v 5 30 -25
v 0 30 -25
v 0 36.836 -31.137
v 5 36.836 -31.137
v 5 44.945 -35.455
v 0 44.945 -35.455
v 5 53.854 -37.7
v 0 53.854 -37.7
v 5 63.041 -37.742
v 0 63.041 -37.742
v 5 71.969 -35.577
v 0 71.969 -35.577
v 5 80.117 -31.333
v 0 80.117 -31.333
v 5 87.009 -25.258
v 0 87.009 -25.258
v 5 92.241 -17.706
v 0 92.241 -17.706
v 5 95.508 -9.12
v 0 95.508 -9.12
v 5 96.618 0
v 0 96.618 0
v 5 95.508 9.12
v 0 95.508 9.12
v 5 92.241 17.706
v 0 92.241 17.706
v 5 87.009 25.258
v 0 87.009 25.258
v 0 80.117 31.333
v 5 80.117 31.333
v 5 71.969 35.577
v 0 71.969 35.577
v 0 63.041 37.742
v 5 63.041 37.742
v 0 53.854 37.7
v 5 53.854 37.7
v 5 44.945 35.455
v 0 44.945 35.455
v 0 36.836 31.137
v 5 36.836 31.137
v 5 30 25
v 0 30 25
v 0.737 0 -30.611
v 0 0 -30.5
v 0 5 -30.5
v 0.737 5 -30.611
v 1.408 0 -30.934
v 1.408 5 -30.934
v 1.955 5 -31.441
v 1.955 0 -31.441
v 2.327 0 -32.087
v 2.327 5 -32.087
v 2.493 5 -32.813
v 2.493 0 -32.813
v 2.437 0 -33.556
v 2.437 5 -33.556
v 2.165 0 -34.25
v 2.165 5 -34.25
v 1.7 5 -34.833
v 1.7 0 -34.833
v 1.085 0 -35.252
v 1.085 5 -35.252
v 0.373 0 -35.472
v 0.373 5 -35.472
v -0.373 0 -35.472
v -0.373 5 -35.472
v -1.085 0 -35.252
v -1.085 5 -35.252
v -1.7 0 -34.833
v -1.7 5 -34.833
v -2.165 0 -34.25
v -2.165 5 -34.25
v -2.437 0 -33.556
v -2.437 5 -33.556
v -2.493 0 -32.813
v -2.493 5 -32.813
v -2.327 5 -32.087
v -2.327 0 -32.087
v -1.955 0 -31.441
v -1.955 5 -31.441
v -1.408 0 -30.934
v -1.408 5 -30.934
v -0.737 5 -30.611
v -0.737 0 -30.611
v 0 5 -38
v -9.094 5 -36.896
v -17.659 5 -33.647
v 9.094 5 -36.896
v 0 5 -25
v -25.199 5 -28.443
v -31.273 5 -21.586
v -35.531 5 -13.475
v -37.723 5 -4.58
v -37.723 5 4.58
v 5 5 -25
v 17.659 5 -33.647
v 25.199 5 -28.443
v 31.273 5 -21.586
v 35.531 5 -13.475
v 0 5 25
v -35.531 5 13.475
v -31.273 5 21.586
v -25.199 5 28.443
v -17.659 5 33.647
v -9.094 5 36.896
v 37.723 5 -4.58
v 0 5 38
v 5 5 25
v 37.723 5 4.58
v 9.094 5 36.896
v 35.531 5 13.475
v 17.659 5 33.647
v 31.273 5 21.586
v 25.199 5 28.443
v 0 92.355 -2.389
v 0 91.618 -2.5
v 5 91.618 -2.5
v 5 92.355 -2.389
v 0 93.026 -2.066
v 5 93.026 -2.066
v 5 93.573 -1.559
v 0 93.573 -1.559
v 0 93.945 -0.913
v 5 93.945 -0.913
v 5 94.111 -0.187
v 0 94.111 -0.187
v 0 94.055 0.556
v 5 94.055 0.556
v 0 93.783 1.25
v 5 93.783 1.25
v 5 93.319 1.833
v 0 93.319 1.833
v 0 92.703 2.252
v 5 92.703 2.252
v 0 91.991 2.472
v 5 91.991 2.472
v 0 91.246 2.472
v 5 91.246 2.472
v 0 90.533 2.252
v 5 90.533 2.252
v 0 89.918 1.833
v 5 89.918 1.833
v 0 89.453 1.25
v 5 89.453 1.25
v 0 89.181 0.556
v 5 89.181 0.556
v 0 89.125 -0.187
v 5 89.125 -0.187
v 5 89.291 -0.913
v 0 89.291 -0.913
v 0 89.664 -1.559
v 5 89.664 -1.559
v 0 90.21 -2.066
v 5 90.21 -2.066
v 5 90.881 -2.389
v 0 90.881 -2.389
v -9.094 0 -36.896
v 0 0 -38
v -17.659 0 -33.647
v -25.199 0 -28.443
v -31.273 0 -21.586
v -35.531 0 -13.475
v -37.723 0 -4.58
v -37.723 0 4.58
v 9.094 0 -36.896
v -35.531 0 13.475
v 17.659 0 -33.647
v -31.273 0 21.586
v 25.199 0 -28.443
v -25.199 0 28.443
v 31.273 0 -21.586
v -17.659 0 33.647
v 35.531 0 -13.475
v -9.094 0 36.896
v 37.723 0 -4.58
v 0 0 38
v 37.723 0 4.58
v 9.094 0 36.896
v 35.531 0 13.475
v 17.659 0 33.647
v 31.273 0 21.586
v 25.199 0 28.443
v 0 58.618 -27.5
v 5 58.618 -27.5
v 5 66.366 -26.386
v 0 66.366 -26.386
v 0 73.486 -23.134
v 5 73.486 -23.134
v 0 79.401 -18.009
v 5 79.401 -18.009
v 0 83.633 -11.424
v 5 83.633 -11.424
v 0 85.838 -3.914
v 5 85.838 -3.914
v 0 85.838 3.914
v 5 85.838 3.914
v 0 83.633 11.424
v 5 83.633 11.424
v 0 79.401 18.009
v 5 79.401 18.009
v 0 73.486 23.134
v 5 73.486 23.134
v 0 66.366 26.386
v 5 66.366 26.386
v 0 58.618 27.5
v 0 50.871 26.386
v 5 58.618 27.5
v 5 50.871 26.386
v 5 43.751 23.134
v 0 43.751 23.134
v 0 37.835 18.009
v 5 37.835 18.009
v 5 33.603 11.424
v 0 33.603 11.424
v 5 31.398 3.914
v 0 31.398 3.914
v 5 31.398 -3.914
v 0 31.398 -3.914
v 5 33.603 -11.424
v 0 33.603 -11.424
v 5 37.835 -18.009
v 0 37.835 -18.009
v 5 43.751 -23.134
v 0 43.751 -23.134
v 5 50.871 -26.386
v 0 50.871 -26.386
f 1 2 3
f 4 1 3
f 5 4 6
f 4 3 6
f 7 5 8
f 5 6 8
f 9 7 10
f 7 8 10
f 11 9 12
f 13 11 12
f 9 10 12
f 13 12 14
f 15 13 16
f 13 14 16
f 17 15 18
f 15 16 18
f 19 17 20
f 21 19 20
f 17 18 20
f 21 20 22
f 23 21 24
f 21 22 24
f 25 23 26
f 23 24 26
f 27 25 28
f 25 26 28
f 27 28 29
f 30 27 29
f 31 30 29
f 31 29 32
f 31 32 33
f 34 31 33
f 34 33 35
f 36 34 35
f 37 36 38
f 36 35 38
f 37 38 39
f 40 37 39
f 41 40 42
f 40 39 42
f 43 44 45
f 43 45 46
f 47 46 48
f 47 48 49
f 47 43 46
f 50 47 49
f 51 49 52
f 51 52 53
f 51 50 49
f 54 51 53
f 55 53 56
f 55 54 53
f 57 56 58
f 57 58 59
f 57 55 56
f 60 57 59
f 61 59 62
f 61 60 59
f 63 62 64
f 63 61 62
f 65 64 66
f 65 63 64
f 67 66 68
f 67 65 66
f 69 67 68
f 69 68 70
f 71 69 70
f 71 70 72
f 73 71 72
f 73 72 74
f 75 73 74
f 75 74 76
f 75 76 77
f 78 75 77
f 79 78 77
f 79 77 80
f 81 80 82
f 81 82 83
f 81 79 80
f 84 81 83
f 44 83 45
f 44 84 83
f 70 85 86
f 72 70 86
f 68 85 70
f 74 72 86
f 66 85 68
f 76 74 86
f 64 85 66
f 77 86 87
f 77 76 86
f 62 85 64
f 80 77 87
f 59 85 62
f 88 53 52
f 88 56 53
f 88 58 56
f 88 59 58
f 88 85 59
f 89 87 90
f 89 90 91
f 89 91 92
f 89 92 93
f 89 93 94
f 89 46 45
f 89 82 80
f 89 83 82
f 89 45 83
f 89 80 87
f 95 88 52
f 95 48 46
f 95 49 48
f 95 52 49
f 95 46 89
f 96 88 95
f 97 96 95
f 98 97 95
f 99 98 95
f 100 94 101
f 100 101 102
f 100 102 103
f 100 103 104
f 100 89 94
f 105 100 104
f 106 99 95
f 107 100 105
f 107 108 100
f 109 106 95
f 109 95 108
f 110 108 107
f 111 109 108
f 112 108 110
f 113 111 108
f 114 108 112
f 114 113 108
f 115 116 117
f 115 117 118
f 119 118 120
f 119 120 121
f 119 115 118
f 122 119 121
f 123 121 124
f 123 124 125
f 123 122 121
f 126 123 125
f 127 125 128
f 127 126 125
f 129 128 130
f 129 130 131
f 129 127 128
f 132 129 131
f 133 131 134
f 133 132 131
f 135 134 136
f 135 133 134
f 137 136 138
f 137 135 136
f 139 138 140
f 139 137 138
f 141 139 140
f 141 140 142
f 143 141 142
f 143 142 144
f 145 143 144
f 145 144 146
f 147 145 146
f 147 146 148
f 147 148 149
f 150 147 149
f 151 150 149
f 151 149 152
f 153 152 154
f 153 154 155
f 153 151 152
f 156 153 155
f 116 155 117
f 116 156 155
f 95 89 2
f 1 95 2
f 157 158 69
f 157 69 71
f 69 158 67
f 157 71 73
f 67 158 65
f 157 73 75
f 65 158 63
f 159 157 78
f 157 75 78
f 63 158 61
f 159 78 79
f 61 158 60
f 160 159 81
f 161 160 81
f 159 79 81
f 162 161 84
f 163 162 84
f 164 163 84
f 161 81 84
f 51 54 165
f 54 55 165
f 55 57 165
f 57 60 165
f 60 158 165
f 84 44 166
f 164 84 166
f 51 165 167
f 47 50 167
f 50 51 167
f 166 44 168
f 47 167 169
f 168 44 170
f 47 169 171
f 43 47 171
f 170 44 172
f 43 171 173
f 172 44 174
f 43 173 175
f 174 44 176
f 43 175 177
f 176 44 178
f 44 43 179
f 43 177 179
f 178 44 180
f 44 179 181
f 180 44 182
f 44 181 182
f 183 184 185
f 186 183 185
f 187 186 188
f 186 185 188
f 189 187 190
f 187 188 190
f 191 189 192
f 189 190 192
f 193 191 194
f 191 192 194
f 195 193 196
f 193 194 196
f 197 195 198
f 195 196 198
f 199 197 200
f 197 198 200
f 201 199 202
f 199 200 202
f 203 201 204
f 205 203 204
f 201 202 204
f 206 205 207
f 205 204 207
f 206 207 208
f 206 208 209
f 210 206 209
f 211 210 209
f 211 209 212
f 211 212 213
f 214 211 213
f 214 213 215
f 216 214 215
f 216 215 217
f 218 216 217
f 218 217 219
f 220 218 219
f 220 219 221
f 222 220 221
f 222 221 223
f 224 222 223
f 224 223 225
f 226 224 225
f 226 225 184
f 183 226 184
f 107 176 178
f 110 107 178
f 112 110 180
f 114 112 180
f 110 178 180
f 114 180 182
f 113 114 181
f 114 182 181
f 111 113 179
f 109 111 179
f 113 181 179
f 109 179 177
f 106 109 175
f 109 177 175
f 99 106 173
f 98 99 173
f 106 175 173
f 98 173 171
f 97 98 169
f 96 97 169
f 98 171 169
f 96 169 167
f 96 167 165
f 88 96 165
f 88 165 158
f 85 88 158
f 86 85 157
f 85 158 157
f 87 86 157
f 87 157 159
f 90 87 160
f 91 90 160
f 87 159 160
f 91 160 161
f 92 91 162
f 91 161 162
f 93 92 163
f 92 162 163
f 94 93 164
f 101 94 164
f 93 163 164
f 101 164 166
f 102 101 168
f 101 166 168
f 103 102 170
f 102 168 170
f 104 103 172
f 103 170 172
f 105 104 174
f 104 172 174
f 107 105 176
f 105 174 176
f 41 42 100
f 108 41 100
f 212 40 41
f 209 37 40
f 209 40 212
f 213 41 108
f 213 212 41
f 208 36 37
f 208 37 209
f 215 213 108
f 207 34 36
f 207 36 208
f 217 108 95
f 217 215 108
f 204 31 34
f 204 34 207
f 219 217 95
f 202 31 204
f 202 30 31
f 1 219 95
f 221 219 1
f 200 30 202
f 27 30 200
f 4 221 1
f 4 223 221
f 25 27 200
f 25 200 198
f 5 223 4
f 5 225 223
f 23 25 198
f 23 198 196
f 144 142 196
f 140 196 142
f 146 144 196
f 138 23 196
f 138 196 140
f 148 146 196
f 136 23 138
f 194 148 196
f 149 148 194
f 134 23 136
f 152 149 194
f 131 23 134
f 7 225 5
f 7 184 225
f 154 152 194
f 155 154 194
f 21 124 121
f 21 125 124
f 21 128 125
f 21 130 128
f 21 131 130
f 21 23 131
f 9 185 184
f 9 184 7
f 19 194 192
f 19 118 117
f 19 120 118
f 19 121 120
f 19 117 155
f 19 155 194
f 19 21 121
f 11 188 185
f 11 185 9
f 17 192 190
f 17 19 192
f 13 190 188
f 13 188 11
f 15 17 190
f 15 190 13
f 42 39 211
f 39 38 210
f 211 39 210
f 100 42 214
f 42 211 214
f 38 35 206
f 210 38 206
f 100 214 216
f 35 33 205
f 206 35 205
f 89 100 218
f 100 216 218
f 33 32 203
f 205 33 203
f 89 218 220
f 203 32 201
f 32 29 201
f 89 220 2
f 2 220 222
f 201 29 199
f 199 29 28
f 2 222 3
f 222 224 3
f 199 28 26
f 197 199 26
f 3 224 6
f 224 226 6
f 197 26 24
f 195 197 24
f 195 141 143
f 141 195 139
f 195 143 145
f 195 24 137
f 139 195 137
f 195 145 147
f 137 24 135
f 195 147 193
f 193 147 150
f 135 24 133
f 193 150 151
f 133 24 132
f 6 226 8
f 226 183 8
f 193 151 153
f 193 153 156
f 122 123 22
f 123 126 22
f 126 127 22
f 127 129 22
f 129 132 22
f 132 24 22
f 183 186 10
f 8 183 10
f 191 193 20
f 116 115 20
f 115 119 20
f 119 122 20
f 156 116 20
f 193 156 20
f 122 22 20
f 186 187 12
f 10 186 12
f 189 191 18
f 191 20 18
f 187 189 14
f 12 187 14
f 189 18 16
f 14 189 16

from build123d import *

# Parameters (mm, degrees)
SKETCH_1_R          = 38
SKETCH_1_R_2        = 2.5
EXTRUDE_1_DEPTH     = 5
SKETCH_5_R          = 2.5
EXTRUDE_3_DEPTH     = 5
CUT_EXTRUDE_1_REACH = 114.375
SKETCH_6_R          = 27.5


with BuildPart() as part:
    # 草图1 → 凸台-拉伸1 (new body)
    with BuildSketch(Plane(origin=(0, 0, 0), x_dir=(1, 0, 0), z_dir=(0, 1, 0))):
        with Locations(Location((0, 0, 0), (0, 0, 270))):
            Circle(SKETCH_1_R)
        with Locations(Location((0, 33, 0), (0, 0, 270))):
            Circle(SKETCH_1_R_2, mode=Mode.SUBTRACT)
    extrude(amount=EXTRUDE_1_DEPTH)

    # 草图5 → 凸台-拉伸3 (add)
    with BuildSketch(Plane(origin=(0, 0, 0), x_dir=(0, 0, -1), z_dir=(1, 0, 0))):
        with BuildLine():
            Line((-25, 30), (-25, 5))
            Line((-25, 5), (25, 5))
            Line((25, 5), (25, 30))
            ThreePointArc((25, 30), (0, 96.618176043), (-25, 30))
        make_face()
        with Locations((0, 91.618176043)):
            Circle(SKETCH_5_R, mode=Mode.SUBTRACT)
    extrude(amount=EXTRUDE_3_DEPTH)

    # 草图6 → 切除-拉伸1 (cut, up to next)
    with BuildSketch(Plane(origin=(5, 0, 0), x_dir=(0, 0, -1), z_dir=(1, 0, 0)), mode=Mode.PRIVATE) as cut_extrude_1_sk1:
        with Locations((0, 58.618176043)):
            Circle(SKETCH_6_R)
    cut_extrude_1_tool1 = extrude(cut_extrude_1_sk1.sketch, amount=-CUT_EXTRUDE_1_REACH, mode=Mode.PRIVATE) & part.part
    add(cut_extrude_1_tool1.solids().sort_by_distance((5, 58.618176, 0))[0], mode=Mode.SUBTRACT)


solid = part.part
